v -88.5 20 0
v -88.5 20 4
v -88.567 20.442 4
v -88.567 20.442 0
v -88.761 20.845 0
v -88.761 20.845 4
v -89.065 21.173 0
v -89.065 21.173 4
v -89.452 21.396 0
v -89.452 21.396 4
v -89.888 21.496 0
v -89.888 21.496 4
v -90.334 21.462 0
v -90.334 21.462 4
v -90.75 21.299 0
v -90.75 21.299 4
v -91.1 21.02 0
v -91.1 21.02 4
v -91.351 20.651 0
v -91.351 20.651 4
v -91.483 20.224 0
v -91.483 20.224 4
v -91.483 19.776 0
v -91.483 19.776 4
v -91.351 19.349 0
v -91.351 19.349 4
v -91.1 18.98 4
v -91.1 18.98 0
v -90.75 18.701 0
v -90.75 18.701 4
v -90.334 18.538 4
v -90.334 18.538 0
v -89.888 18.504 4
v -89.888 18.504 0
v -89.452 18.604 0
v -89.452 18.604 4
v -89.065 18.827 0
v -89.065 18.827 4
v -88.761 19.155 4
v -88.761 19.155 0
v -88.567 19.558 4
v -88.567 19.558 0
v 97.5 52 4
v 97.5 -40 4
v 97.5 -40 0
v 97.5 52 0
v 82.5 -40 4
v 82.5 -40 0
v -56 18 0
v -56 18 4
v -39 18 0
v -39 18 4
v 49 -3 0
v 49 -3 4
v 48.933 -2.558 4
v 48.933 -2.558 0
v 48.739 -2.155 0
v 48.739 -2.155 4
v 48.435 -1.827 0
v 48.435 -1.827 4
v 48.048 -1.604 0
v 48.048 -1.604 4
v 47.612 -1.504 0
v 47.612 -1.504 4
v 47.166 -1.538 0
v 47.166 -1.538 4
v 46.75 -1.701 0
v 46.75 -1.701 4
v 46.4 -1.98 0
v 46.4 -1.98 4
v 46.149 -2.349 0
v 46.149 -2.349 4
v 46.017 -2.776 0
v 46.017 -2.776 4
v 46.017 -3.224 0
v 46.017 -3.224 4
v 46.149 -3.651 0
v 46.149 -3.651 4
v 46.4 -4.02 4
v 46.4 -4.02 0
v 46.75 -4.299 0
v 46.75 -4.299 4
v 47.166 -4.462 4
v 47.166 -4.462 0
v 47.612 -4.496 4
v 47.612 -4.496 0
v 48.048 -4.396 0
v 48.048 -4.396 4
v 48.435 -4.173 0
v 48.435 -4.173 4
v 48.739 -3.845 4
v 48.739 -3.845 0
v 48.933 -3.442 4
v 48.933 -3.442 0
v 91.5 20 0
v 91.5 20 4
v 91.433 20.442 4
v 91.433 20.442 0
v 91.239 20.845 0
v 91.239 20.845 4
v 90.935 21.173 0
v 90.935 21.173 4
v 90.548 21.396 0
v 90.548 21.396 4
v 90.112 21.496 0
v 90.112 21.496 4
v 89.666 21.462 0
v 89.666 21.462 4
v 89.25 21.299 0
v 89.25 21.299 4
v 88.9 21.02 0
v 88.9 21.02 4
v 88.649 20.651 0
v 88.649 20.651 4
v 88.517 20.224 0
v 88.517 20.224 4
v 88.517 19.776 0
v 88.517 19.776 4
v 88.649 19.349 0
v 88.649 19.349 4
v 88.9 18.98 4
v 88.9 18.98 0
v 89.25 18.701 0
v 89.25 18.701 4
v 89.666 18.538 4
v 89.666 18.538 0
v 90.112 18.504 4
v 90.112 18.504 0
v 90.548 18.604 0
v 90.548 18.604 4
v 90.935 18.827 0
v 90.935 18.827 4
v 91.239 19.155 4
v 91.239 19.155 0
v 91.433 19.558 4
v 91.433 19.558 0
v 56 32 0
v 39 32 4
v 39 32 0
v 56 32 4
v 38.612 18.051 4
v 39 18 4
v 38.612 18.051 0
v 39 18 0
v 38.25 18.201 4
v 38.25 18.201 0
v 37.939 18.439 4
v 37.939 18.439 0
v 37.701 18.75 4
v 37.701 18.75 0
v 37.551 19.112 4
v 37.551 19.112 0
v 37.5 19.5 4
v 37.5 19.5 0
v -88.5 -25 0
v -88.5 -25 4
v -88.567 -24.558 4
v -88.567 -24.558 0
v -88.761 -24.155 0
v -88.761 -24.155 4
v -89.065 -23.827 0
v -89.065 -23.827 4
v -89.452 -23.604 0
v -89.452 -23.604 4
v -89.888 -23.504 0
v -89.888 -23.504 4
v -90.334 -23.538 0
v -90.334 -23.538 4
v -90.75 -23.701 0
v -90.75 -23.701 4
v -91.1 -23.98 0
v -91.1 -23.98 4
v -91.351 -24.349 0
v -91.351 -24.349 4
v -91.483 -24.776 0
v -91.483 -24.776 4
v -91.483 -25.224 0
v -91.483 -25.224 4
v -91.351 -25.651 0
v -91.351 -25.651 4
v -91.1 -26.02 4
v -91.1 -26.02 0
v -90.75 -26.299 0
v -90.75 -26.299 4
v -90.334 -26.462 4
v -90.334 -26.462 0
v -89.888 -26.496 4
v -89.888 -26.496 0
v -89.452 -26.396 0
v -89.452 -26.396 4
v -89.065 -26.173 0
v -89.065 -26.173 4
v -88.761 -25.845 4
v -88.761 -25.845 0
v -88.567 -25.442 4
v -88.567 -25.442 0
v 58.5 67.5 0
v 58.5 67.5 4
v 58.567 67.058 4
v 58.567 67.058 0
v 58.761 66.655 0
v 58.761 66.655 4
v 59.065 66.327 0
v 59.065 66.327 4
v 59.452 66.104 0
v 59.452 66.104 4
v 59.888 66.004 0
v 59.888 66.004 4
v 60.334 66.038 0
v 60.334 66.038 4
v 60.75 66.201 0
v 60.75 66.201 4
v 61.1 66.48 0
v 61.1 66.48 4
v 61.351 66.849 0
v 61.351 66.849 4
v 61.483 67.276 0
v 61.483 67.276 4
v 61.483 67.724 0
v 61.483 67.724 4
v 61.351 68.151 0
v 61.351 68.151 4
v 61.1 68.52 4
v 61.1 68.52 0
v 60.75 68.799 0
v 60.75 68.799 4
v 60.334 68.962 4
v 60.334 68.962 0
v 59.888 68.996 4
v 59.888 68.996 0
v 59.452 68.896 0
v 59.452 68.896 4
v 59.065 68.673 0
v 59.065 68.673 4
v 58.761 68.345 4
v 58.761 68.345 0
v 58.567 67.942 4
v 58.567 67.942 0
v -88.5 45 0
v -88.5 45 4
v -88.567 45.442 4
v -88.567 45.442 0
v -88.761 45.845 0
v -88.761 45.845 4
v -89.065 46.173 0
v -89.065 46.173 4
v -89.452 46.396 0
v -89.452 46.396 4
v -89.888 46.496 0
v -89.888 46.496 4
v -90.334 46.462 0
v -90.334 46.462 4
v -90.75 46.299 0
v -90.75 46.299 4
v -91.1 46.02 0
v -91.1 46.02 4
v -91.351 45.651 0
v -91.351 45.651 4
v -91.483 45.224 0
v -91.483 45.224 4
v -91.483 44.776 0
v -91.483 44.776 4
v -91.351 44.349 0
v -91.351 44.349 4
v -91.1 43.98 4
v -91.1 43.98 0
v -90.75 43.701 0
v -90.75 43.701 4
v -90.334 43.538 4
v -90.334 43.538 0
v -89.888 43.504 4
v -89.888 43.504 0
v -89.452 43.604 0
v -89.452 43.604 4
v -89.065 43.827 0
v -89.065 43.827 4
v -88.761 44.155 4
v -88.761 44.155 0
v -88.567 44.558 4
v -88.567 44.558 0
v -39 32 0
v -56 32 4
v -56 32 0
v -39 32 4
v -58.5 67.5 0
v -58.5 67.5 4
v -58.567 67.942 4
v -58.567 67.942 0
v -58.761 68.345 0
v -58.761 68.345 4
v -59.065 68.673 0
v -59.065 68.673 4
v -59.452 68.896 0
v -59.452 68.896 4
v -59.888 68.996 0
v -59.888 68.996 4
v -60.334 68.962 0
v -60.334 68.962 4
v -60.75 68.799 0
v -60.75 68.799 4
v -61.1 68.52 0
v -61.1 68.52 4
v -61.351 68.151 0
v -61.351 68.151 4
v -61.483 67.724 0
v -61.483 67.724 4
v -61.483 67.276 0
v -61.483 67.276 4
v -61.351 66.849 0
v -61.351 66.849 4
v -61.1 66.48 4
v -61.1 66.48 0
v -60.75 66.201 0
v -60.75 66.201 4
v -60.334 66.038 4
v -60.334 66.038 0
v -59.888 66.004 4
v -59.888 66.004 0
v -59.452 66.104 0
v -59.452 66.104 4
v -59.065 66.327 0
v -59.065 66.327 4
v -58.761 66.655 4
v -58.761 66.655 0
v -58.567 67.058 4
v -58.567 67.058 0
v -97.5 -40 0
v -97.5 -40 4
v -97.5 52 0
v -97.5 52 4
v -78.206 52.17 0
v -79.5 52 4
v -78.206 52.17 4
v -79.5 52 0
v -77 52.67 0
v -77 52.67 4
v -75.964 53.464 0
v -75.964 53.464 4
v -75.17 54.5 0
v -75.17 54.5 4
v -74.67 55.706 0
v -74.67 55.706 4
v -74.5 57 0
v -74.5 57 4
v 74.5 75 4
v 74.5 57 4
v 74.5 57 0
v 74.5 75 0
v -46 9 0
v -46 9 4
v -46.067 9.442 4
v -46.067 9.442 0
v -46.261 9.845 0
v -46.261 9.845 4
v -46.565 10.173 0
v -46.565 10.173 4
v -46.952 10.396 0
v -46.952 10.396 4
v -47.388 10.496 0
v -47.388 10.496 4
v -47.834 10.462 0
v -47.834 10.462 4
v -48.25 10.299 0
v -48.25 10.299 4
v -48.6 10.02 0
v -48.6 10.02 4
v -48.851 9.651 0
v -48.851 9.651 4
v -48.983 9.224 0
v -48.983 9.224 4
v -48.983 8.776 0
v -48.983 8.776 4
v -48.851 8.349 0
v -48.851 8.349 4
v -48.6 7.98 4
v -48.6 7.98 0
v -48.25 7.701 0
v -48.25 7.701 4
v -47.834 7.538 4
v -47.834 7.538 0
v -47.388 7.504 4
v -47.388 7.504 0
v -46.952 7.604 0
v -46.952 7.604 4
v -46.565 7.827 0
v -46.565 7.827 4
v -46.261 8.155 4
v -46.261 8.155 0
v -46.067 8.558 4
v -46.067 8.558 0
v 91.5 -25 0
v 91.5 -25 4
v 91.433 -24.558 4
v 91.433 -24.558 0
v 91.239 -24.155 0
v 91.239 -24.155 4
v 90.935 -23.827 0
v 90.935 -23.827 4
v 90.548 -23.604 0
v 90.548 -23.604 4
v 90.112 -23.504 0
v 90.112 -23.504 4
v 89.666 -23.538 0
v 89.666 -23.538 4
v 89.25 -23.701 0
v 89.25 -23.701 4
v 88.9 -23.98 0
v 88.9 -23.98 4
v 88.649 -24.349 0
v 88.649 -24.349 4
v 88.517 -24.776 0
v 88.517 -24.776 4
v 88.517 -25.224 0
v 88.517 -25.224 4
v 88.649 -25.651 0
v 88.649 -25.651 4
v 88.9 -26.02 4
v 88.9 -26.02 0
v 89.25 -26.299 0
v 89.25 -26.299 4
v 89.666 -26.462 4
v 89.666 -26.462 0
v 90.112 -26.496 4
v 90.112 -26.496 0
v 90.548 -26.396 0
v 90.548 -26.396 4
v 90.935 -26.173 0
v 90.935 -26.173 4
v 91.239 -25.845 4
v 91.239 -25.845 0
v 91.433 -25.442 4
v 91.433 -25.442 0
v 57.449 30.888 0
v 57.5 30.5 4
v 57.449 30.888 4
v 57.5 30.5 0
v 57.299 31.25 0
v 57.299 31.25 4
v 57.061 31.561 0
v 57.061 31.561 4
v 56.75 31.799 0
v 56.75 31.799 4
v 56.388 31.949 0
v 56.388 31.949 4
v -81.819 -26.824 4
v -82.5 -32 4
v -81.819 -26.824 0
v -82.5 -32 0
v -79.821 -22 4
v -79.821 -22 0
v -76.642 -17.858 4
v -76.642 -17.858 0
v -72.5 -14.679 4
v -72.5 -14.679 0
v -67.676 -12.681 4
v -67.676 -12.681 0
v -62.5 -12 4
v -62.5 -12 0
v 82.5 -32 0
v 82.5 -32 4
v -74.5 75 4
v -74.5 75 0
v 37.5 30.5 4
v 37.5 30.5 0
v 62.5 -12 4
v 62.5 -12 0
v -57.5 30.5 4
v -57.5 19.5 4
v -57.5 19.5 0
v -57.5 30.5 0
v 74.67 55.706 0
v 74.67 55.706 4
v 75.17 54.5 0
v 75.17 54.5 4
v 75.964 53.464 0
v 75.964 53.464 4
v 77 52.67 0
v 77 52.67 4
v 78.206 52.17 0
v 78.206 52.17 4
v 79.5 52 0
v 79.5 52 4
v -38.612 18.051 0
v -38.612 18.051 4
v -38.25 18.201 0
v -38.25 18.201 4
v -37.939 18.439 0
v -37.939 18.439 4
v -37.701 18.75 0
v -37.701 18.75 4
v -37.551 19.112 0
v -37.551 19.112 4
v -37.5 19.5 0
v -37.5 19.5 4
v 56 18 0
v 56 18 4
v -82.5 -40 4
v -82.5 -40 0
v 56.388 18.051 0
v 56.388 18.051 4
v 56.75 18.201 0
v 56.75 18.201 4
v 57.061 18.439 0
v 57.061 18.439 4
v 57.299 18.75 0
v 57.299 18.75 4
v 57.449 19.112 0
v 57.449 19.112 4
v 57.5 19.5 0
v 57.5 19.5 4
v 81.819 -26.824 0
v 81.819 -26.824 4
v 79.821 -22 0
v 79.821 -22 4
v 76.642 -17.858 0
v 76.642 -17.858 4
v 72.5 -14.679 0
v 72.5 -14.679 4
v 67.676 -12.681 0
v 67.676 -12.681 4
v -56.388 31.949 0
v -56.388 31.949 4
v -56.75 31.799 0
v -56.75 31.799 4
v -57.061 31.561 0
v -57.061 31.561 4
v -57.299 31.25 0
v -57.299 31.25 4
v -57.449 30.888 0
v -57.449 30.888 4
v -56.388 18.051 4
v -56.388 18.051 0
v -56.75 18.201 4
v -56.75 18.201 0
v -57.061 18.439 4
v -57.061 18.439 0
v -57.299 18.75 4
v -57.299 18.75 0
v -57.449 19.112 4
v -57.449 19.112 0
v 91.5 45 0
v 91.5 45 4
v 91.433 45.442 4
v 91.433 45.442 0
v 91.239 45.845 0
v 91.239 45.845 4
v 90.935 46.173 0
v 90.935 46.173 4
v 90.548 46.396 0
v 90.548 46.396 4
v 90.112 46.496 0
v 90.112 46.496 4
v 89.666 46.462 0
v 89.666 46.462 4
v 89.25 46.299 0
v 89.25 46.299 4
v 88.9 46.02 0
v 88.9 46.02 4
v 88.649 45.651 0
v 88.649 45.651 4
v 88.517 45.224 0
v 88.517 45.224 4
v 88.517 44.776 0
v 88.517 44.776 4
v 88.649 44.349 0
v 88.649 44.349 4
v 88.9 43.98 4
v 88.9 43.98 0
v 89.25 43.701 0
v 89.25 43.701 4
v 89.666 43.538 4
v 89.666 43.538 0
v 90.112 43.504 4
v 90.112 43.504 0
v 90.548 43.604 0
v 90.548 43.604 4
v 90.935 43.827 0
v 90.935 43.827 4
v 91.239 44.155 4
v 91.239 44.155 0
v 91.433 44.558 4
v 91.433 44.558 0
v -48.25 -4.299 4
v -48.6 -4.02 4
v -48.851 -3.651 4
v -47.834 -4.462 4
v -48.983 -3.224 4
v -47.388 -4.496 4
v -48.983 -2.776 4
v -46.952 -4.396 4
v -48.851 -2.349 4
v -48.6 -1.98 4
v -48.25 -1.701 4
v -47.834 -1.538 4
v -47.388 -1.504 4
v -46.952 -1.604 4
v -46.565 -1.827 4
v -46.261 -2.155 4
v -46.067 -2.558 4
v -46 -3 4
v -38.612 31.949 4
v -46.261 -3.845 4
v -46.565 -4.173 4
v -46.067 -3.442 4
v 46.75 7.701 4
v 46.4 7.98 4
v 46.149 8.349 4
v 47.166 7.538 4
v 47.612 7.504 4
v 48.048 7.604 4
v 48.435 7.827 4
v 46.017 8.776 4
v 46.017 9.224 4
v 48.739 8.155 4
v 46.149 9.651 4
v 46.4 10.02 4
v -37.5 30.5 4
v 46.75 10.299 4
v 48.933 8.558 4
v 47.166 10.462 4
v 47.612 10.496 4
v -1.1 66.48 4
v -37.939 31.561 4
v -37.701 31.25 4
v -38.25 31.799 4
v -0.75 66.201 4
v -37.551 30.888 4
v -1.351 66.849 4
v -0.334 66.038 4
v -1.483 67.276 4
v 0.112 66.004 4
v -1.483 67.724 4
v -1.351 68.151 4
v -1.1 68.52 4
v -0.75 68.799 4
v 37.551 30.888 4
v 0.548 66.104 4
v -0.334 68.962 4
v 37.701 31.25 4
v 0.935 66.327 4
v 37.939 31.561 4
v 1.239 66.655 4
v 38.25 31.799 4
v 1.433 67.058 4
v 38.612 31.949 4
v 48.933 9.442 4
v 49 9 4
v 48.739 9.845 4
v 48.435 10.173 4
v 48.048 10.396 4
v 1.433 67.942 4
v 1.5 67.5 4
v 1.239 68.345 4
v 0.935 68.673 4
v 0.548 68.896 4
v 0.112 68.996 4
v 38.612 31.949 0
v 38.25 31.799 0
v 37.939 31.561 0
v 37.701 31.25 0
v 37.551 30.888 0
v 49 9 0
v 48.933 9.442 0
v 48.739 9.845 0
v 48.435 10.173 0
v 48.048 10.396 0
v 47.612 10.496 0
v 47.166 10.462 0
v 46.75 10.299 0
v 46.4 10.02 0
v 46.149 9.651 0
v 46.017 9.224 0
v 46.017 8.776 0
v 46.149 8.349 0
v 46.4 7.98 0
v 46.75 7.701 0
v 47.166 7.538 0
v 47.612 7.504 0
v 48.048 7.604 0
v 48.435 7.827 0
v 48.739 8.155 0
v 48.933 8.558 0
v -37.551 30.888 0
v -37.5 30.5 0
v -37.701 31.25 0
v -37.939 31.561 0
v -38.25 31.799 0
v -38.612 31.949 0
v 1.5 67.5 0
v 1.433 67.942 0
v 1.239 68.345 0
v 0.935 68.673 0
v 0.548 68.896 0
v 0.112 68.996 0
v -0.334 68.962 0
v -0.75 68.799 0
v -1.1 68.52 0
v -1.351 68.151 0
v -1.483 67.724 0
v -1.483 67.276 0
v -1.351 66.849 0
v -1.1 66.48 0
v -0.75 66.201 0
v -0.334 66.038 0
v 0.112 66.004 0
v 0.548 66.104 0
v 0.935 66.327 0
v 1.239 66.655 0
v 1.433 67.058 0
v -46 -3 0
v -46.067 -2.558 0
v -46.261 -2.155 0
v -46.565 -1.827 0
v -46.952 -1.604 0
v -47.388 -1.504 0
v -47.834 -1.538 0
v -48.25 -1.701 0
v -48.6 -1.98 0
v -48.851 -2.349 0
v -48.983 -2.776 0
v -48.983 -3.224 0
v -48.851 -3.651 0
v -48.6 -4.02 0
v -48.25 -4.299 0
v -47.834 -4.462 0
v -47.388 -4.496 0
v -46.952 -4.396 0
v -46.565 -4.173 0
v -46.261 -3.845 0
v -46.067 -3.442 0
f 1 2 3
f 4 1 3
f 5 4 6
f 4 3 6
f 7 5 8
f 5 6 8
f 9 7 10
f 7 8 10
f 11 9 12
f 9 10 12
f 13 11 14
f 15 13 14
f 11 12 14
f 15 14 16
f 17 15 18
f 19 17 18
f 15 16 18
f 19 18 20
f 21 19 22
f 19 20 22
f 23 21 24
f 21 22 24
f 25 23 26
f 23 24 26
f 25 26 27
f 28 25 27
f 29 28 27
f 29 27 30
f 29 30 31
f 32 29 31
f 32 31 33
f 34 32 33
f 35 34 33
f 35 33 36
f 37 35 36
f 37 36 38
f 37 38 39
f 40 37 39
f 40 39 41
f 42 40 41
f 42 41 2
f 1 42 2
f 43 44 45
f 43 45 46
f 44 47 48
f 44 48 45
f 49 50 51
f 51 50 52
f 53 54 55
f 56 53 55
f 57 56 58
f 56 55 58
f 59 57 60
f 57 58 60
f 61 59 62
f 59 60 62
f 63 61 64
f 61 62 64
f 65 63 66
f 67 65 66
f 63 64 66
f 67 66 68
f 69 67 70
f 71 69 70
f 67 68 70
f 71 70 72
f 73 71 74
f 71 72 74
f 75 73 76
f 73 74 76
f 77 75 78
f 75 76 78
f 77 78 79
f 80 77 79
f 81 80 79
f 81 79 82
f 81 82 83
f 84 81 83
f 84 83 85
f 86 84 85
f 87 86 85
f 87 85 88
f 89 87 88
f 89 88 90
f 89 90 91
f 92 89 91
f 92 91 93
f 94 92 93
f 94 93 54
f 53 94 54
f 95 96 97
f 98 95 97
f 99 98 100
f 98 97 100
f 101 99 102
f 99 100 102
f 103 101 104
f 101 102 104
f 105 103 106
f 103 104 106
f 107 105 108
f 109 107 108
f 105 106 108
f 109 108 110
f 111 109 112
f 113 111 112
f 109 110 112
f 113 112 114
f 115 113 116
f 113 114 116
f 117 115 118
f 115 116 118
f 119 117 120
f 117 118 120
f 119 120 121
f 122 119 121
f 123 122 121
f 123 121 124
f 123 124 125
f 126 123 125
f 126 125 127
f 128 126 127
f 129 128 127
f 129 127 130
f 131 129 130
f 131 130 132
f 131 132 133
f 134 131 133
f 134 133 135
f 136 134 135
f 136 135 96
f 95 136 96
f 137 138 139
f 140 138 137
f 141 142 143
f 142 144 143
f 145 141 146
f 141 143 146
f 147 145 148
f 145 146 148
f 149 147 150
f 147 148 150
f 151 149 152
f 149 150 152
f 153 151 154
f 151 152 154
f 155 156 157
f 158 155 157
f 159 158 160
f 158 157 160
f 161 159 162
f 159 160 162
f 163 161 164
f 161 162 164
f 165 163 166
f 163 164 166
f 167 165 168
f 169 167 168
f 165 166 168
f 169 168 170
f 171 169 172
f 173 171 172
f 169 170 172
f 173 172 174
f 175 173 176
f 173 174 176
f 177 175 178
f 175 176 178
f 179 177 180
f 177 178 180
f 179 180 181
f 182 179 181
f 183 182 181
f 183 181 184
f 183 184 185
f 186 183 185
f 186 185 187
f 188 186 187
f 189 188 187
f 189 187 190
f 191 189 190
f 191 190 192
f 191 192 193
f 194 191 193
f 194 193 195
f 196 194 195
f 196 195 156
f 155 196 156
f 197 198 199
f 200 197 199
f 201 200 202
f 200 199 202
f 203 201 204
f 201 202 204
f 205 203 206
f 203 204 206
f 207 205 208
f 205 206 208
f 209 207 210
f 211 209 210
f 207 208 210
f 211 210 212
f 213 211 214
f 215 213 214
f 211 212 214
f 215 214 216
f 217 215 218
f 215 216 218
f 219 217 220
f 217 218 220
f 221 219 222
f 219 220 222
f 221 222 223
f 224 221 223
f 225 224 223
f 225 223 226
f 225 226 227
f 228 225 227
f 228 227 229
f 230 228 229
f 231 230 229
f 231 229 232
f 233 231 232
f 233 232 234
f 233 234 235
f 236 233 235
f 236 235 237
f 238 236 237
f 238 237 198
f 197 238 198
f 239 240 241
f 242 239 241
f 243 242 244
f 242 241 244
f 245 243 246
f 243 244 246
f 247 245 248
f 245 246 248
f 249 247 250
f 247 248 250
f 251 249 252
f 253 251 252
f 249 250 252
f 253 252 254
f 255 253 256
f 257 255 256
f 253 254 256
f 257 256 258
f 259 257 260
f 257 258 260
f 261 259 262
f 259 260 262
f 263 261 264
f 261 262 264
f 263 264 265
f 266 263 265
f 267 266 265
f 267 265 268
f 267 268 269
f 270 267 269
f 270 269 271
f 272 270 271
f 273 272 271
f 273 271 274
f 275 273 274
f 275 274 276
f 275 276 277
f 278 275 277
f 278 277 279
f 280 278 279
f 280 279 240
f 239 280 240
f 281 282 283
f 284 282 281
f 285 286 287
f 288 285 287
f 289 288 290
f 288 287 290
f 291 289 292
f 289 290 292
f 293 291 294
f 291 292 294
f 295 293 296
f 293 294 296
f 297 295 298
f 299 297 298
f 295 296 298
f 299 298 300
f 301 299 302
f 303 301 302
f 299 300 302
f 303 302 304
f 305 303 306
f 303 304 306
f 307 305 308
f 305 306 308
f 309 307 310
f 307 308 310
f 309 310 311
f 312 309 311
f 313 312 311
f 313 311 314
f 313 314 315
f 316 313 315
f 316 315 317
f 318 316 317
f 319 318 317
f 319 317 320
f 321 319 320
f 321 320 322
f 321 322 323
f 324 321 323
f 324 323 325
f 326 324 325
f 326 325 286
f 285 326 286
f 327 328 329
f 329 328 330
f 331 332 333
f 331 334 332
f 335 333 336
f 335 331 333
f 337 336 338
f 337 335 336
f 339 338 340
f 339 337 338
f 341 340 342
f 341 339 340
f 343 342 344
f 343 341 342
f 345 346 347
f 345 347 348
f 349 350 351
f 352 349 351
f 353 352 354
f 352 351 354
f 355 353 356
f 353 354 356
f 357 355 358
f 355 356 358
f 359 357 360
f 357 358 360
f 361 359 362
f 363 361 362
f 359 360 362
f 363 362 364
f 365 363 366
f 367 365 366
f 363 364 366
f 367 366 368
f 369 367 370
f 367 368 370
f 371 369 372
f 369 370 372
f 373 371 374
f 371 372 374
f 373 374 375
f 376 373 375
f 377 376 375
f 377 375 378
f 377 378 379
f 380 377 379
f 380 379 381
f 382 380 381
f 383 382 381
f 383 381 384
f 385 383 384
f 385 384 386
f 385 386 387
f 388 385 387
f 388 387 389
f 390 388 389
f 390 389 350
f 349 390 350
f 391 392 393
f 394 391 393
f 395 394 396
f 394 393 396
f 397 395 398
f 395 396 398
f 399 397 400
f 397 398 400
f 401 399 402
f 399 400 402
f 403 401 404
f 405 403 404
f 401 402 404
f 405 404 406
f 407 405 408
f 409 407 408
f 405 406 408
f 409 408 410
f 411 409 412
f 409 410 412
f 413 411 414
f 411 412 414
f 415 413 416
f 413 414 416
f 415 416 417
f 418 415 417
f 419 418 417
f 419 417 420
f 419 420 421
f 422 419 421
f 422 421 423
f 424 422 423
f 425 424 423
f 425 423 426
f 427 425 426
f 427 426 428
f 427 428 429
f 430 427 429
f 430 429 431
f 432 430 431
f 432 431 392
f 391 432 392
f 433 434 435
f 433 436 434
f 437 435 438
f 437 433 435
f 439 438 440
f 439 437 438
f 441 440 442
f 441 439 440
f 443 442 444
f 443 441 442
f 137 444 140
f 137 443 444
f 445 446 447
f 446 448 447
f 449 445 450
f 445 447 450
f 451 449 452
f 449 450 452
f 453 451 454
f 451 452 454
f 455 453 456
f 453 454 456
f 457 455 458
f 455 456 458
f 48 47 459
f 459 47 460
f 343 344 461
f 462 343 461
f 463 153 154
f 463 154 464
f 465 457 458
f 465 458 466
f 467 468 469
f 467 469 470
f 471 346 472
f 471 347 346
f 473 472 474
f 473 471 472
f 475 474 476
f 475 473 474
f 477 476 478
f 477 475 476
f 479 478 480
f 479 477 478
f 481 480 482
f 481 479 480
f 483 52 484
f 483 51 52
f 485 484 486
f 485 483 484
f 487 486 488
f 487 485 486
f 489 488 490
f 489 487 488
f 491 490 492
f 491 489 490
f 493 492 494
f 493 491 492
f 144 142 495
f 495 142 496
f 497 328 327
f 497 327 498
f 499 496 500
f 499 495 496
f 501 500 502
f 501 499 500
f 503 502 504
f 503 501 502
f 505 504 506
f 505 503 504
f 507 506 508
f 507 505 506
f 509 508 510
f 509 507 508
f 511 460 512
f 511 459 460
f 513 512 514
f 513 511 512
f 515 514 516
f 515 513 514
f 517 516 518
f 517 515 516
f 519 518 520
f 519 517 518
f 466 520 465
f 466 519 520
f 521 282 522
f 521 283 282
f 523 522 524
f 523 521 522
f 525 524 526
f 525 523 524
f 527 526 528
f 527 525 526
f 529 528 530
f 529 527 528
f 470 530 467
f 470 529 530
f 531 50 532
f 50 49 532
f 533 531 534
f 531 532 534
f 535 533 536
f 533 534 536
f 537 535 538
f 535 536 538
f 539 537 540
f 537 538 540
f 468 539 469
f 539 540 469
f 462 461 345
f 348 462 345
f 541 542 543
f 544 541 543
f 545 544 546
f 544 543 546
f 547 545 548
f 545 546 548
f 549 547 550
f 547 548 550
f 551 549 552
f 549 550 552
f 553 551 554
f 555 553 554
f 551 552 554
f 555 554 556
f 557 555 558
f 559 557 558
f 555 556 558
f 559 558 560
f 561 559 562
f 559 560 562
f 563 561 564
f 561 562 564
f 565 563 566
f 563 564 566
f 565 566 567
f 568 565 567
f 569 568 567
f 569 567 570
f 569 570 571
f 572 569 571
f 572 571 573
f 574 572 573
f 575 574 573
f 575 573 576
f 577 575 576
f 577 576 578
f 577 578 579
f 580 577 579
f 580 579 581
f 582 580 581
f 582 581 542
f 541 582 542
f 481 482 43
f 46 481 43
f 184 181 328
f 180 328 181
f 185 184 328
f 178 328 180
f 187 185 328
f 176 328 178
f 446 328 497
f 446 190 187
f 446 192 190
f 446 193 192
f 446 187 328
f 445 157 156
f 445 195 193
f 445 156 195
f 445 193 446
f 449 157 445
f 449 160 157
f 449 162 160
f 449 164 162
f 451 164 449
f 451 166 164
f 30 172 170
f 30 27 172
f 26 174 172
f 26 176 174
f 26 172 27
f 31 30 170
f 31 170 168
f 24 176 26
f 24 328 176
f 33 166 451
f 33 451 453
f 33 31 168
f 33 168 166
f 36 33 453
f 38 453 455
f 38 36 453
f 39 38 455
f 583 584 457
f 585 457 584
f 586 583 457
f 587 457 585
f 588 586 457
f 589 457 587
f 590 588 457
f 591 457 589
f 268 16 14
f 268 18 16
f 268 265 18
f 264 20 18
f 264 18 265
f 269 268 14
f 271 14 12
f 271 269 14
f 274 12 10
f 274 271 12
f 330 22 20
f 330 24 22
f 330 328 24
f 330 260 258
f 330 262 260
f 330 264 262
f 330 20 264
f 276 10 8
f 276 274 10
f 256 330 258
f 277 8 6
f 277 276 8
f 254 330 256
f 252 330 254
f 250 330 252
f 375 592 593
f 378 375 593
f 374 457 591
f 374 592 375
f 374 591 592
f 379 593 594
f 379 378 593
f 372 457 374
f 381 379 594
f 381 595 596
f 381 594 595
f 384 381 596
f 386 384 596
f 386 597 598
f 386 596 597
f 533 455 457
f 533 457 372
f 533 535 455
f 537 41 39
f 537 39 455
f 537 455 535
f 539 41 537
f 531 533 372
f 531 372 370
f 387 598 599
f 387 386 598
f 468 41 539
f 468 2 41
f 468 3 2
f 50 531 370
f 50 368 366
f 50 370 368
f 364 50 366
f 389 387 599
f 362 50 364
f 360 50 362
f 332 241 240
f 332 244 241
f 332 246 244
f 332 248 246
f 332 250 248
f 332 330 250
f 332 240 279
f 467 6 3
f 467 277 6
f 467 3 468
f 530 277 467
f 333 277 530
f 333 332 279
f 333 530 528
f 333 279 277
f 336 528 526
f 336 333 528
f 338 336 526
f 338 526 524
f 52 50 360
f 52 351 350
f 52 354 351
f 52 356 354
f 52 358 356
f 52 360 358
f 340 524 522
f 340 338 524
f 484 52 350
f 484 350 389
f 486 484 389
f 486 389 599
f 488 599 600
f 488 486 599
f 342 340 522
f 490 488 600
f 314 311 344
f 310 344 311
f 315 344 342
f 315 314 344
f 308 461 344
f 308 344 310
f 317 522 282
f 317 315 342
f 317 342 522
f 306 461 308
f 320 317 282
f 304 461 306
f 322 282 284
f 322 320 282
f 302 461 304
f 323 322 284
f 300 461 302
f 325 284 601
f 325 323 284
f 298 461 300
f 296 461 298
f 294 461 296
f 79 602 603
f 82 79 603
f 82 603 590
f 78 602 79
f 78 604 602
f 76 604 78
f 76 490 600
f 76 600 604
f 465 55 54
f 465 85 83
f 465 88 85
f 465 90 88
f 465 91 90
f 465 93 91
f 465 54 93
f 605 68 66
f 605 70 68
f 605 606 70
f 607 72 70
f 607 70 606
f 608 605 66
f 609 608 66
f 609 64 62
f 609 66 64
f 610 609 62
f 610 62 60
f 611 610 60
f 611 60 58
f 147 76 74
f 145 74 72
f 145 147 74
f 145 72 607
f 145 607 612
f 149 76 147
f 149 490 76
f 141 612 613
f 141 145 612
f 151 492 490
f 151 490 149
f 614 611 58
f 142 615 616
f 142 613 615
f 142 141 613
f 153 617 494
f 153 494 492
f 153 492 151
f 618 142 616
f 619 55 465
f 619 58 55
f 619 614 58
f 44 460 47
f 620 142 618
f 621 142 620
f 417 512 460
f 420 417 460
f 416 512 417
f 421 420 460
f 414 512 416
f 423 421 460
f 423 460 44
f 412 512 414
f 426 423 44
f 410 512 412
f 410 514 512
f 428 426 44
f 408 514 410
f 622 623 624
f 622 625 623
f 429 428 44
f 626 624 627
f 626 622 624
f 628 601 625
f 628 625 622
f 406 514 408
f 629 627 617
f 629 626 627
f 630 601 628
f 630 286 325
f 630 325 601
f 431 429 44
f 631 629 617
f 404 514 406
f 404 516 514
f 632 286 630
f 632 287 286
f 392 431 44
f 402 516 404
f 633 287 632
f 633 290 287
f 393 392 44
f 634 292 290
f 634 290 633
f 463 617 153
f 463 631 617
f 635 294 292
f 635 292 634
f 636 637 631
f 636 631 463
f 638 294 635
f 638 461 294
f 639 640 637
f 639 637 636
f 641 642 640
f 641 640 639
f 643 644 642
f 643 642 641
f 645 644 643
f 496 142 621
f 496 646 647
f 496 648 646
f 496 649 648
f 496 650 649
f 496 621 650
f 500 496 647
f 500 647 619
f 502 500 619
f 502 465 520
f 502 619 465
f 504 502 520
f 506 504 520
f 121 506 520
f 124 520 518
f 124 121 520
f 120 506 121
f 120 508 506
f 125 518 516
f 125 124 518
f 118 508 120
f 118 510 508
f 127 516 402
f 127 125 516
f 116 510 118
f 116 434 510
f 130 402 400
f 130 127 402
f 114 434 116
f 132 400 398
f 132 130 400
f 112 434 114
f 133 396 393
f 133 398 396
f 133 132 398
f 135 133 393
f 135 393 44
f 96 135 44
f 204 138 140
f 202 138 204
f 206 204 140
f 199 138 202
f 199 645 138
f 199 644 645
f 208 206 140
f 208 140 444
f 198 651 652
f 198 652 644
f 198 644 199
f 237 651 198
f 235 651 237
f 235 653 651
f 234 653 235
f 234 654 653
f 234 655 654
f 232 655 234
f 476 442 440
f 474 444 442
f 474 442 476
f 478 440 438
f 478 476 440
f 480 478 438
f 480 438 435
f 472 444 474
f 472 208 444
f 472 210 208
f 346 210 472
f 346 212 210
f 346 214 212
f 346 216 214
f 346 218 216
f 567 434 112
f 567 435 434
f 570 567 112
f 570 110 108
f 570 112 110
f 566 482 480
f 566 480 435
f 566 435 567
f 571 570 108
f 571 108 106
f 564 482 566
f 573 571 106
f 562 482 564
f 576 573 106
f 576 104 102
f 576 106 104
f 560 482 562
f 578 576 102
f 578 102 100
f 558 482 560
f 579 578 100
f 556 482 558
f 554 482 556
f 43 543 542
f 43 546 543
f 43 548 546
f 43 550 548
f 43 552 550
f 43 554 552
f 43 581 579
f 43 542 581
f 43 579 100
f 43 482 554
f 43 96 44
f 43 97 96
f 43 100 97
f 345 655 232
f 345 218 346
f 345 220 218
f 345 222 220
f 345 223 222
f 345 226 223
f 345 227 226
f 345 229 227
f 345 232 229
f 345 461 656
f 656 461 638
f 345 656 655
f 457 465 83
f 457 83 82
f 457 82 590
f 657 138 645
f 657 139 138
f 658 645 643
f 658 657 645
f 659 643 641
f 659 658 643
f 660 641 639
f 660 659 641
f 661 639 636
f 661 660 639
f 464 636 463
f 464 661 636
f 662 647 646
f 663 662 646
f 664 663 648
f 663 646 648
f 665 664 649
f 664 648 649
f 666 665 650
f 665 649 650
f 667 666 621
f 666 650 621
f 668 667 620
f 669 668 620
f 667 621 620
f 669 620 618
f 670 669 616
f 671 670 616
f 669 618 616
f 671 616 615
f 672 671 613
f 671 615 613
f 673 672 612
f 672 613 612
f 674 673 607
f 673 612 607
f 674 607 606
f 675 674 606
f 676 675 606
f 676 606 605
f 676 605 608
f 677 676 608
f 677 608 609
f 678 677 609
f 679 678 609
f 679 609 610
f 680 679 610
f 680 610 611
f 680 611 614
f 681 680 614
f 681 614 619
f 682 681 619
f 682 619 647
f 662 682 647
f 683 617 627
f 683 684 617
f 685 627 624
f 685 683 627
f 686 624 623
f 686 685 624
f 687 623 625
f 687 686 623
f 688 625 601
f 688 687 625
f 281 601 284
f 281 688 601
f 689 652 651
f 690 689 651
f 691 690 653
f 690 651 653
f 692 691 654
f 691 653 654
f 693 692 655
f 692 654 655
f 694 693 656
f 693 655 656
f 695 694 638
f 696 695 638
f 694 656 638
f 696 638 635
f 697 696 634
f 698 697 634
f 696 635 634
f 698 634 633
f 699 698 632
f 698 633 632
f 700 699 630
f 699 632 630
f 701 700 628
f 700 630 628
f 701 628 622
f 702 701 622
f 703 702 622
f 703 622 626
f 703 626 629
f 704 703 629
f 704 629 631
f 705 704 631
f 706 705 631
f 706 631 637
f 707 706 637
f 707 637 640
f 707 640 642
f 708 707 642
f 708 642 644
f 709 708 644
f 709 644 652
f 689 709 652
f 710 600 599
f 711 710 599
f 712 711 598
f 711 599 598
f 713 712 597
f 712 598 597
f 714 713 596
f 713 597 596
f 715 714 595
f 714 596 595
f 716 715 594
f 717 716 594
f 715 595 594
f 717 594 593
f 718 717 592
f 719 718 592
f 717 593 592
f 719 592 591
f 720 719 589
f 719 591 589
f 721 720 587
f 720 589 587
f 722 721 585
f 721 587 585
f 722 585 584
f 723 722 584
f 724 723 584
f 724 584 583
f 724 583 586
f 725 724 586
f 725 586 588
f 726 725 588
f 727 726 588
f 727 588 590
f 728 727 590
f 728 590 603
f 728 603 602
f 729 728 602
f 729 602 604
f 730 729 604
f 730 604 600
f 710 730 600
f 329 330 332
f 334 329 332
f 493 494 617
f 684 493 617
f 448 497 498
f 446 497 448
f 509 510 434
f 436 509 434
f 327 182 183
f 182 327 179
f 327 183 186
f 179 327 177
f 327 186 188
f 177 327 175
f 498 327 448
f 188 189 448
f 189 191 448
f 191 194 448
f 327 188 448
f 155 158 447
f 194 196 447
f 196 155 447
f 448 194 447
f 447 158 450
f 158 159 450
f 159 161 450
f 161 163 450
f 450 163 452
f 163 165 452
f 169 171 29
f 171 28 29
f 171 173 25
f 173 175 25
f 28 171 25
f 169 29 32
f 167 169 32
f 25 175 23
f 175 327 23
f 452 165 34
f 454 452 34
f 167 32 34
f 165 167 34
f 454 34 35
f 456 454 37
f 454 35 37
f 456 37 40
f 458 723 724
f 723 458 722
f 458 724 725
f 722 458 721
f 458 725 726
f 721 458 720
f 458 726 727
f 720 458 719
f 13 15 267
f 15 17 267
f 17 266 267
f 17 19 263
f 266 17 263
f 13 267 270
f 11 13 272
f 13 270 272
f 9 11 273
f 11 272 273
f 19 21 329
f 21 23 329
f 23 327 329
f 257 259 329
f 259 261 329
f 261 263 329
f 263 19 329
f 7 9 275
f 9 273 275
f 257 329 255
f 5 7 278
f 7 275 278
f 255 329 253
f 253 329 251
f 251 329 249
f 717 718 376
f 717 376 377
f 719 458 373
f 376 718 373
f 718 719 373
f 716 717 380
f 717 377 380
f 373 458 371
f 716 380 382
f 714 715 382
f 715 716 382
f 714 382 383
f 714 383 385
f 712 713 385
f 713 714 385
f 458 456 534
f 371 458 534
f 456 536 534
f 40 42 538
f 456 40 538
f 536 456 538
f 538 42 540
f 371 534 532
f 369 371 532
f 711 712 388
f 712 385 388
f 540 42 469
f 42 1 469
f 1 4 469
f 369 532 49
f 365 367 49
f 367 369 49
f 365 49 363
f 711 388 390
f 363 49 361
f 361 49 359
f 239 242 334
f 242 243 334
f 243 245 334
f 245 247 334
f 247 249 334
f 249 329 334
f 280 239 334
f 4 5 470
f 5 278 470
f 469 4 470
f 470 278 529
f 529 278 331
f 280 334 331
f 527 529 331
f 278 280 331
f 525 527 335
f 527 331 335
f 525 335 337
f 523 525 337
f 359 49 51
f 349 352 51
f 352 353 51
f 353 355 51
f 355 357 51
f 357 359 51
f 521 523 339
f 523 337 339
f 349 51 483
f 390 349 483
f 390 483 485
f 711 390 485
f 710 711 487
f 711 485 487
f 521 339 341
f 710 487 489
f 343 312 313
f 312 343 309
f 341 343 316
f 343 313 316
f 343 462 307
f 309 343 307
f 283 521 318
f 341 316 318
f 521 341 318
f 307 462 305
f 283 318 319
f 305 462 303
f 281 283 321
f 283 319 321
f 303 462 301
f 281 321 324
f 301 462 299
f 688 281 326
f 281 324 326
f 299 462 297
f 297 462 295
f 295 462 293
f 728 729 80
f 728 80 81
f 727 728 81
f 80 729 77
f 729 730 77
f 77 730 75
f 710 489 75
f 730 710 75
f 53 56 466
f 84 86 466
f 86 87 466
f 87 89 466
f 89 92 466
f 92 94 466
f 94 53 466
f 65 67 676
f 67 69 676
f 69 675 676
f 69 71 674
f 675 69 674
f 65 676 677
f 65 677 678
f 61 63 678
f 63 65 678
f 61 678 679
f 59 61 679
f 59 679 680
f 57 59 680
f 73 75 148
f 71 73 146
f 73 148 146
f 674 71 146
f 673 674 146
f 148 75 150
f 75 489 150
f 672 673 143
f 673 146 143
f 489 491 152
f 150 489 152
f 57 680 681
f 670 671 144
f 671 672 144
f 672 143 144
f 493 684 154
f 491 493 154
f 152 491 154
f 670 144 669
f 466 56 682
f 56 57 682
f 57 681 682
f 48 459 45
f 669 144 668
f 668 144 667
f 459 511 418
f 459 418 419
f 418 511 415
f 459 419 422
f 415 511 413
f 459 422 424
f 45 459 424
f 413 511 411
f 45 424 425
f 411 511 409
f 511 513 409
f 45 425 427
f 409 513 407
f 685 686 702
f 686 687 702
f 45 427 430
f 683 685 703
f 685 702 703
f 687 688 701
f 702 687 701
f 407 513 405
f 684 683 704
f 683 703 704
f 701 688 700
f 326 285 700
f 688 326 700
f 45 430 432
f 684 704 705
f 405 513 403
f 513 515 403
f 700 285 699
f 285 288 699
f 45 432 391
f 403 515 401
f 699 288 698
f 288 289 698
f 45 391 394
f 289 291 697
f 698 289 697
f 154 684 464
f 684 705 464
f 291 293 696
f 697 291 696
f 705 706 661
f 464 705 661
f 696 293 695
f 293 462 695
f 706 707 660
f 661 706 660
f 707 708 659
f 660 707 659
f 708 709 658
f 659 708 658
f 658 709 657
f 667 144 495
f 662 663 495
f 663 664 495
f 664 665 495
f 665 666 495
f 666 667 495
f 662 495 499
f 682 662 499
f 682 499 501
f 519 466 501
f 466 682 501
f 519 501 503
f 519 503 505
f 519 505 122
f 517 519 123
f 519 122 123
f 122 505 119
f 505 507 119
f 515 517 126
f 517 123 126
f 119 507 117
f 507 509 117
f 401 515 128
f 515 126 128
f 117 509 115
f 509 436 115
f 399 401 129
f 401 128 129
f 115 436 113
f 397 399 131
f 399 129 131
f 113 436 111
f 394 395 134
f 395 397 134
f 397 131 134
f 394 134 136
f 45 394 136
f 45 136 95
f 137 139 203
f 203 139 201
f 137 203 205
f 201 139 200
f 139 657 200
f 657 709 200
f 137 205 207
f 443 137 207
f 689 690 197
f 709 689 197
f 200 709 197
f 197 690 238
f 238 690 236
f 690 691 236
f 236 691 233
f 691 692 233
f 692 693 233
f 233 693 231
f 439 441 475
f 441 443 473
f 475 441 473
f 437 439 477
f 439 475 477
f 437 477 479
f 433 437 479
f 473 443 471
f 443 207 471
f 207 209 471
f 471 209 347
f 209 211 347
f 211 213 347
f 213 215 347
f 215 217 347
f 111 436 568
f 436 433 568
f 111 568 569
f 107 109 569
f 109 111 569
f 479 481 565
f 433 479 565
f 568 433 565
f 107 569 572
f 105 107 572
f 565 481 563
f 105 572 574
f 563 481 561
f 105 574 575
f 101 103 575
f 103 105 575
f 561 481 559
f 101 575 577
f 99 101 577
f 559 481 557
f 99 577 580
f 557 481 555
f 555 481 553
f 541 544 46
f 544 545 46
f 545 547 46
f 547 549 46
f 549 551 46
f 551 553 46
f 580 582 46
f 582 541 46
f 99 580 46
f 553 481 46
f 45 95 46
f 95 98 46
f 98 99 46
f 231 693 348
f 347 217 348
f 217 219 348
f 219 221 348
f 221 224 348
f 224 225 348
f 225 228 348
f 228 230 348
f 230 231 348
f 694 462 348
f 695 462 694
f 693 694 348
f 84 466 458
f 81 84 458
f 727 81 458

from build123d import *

# Parameters (mm, degrees)
SKETCH_1_W          = 195
SKETCH_1_H          = 50
EXTRUDE_1_DEPTH     = 4
SKETCH_5_W          = 195
SKETCH_5_H          = 50
EXTRUDE_2_DEPTH     = 4
SKETCH_2_R          = 1.5
CUT_EXTRUDE_1_DEPTH = 124.074164633
SKETCH_4_W          = 20
SKETCH_4_H          = 14
CUT_EXTRUDE_3_DEPTH = 124.074164633
FILLET_1_R          = 1.5
SKETCH_6_W          = 23
SKETCH_6_H          = 23
CUT_EXTRUDE_4_DEPTH = 124.074164633
FILLET_2_R          = 5
SKETCH_7_W          = 15
SKETCH_7_H          = 15
EXTRUDE_3_DEPTH     = 4
SKETCH_3_R          = 1.5
CUT_EXTRUDE_2_DEPTH = 124.074164633
SKETCH_8_R          = 1.5
CUT_EXTRUDE_5_DEPTH = 124.074164633
SKETCH_9_W          = 165
SKETCH_9_H          = 13
CUT_EXTRUDE_6_DEPTH = 124.074164633
FILLET_3_R          = 20


with BuildPart() as part:
    # 草图1 → 凸台-拉伸1 (new body)
    with BuildSketch(Plane.XY):
        Rectangle(SKETCH_1_W, SKETCH_1_H)
    extrude(amount=EXTRUDE_1_DEPTH)

    # 草图5 → 凸台-拉伸2 (add)
    with BuildSketch(Plane.XY.offset(4)):
        with Locations((0, 50)):
            Rectangle(SKETCH_5_W, SKETCH_5_H)
    extrude(amount=-EXTRUDE_2_DEPTH)

    # 草图2 → 切除-拉伸1 (cut, through all)
    with BuildSketch(Plane.XY.offset(4)):
        with Locations((-47.5, -3)):
            Circle(SKETCH_2_R)
        with Locations((-47.5, 9)):
            Circle(SKETCH_2_R)
        with Locations((47.5, 9)):
            Circle(SKETCH_2_R)
        with Locations((47.5, -3)):
            Circle(SKETCH_2_R)
    extrude(amount=-CUT_EXTRUDE_1_DEPTH, mode=Mode.SUBTRACT)

    # 草图4 → 切除-拉伸3 (cut, through all)
    with BuildSketch(Plane.XY.offset(4)):
        with Locations((47.5, 25)):
            Rectangle(SKETCH_4_W, SKETCH_4_H)
        with Locations((-47.5, 25)):
            Rectangle(SKETCH_4_W, SKETCH_4_H)
    extrude(amount=-CUT_EXTRUDE_3_DEPTH, mode=Mode.SUBTRACT)

    # 圆角1
    fillet_1_edges = [part.edges().sort_by_distance(p)[0] for p in [
        (37.5, 18, 2),
        (37.5, 32, 2),
        (57.5, 32, 2),
        (57.5, 18, 2),
        (-57.5, 32, 2),
        (-37.5, 32, 2),
        (-37.5, 18, 2),
        (-57.5, 18, 2),
    ]]
    fillet(fillet_1_edges, radius=FILLET_1_R)

    # 草图6 → 切除-拉伸4 (cut, through all)
    with BuildSketch(Plane.XY.offset(4)):
        with Locations((-86, 63.5)):
            Rectangle(SKETCH_6_W, SKETCH_6_H)
        with Locations((86, 63.5)):
            Rectangle(SKETCH_6_W, SKETCH_6_H)
    extrude(amount=-CUT_EXTRUDE_4_DEPTH, mode=Mode.SUBTRACT)

    # 圆角2
    fillet_2_edges = [part.edges().sort_by_distance(p)[0] for p in [
        (-74.5, 52, 2),
        (74.5, 52, 2),
    ]]
    fillet(fillet_2_edges, radius=FILLET_2_R)

    # 草图7 → 凸台-拉伸3 (add)
    with BuildSketch(Plane.XY.offset(4)):
        with Locations((90, -32.5)):
            Rectangle(SKETCH_7_W, SKETCH_7_H)
        with Locations((-90, -32.5)):
            Rectangle(SKETCH_7_W, SKETCH_7_H)
    extrude(amount=-EXTRUDE_3_DEPTH)

    # 草图3 → 切除-拉伸2 (cut, through all)
    with BuildSketch(Plane.XY.offset(4)):
        with Locations((-90, 45)):
            Circle(SKETCH_3_R)
        with Locations((-90, -25)):
            Circle(SKETCH_3_R)
        with Locations((90, -25)):
            Circle(SKETCH_3_R)
        with Locations((90, 45)):
            Circle(SKETCH_3_R)
        with Locations((-90, 20)):
            Circle(SKETCH_3_R)
        with Locations((90, 20)):
            Circle(SKETCH_3_R)
    extrude(amount=-CUT_EXTRUDE_2_DEPTH, mode=Mode.SUBTRACT)

    # 草图8 → 切除-拉伸5 (cut, through all)
    with BuildSketch(Plane.XY.offset(4)):
        with Locations((0, 67.5)):
            Circle(SKETCH_8_R)
        with Locations((-60, 67.5)):
            Circle(SKETCH_8_R)
        with Locations(Location((60, 67.5, 0), (0, 0, 180))):
            Circle(SKETCH_8_R)
    extrude(amount=-CUT_EXTRUDE_5_DEPTH, mode=Mode.SUBTRACT)

    # 草图9 → 切除-拉伸6 (cut, through all)
    with BuildSketch(Plane.XY.offset(4)):
        with Locations((0, -18.5)):
            Rectangle(SKETCH_9_W, SKETCH_9_H)
    extrude(amount=-CUT_EXTRUDE_6_DEPTH, mode=Mode.SUBTRACT)

    # 圆角3
    fillet_3_edges = [part.edges().sort_by_distance(p)[0] for p in [
        (-82.5, -12, 2),
        (82.5, -12, 2),
    ]]
    fillet(fillet_3_edges, radius=FILLET_3_R)


solid = part.part
